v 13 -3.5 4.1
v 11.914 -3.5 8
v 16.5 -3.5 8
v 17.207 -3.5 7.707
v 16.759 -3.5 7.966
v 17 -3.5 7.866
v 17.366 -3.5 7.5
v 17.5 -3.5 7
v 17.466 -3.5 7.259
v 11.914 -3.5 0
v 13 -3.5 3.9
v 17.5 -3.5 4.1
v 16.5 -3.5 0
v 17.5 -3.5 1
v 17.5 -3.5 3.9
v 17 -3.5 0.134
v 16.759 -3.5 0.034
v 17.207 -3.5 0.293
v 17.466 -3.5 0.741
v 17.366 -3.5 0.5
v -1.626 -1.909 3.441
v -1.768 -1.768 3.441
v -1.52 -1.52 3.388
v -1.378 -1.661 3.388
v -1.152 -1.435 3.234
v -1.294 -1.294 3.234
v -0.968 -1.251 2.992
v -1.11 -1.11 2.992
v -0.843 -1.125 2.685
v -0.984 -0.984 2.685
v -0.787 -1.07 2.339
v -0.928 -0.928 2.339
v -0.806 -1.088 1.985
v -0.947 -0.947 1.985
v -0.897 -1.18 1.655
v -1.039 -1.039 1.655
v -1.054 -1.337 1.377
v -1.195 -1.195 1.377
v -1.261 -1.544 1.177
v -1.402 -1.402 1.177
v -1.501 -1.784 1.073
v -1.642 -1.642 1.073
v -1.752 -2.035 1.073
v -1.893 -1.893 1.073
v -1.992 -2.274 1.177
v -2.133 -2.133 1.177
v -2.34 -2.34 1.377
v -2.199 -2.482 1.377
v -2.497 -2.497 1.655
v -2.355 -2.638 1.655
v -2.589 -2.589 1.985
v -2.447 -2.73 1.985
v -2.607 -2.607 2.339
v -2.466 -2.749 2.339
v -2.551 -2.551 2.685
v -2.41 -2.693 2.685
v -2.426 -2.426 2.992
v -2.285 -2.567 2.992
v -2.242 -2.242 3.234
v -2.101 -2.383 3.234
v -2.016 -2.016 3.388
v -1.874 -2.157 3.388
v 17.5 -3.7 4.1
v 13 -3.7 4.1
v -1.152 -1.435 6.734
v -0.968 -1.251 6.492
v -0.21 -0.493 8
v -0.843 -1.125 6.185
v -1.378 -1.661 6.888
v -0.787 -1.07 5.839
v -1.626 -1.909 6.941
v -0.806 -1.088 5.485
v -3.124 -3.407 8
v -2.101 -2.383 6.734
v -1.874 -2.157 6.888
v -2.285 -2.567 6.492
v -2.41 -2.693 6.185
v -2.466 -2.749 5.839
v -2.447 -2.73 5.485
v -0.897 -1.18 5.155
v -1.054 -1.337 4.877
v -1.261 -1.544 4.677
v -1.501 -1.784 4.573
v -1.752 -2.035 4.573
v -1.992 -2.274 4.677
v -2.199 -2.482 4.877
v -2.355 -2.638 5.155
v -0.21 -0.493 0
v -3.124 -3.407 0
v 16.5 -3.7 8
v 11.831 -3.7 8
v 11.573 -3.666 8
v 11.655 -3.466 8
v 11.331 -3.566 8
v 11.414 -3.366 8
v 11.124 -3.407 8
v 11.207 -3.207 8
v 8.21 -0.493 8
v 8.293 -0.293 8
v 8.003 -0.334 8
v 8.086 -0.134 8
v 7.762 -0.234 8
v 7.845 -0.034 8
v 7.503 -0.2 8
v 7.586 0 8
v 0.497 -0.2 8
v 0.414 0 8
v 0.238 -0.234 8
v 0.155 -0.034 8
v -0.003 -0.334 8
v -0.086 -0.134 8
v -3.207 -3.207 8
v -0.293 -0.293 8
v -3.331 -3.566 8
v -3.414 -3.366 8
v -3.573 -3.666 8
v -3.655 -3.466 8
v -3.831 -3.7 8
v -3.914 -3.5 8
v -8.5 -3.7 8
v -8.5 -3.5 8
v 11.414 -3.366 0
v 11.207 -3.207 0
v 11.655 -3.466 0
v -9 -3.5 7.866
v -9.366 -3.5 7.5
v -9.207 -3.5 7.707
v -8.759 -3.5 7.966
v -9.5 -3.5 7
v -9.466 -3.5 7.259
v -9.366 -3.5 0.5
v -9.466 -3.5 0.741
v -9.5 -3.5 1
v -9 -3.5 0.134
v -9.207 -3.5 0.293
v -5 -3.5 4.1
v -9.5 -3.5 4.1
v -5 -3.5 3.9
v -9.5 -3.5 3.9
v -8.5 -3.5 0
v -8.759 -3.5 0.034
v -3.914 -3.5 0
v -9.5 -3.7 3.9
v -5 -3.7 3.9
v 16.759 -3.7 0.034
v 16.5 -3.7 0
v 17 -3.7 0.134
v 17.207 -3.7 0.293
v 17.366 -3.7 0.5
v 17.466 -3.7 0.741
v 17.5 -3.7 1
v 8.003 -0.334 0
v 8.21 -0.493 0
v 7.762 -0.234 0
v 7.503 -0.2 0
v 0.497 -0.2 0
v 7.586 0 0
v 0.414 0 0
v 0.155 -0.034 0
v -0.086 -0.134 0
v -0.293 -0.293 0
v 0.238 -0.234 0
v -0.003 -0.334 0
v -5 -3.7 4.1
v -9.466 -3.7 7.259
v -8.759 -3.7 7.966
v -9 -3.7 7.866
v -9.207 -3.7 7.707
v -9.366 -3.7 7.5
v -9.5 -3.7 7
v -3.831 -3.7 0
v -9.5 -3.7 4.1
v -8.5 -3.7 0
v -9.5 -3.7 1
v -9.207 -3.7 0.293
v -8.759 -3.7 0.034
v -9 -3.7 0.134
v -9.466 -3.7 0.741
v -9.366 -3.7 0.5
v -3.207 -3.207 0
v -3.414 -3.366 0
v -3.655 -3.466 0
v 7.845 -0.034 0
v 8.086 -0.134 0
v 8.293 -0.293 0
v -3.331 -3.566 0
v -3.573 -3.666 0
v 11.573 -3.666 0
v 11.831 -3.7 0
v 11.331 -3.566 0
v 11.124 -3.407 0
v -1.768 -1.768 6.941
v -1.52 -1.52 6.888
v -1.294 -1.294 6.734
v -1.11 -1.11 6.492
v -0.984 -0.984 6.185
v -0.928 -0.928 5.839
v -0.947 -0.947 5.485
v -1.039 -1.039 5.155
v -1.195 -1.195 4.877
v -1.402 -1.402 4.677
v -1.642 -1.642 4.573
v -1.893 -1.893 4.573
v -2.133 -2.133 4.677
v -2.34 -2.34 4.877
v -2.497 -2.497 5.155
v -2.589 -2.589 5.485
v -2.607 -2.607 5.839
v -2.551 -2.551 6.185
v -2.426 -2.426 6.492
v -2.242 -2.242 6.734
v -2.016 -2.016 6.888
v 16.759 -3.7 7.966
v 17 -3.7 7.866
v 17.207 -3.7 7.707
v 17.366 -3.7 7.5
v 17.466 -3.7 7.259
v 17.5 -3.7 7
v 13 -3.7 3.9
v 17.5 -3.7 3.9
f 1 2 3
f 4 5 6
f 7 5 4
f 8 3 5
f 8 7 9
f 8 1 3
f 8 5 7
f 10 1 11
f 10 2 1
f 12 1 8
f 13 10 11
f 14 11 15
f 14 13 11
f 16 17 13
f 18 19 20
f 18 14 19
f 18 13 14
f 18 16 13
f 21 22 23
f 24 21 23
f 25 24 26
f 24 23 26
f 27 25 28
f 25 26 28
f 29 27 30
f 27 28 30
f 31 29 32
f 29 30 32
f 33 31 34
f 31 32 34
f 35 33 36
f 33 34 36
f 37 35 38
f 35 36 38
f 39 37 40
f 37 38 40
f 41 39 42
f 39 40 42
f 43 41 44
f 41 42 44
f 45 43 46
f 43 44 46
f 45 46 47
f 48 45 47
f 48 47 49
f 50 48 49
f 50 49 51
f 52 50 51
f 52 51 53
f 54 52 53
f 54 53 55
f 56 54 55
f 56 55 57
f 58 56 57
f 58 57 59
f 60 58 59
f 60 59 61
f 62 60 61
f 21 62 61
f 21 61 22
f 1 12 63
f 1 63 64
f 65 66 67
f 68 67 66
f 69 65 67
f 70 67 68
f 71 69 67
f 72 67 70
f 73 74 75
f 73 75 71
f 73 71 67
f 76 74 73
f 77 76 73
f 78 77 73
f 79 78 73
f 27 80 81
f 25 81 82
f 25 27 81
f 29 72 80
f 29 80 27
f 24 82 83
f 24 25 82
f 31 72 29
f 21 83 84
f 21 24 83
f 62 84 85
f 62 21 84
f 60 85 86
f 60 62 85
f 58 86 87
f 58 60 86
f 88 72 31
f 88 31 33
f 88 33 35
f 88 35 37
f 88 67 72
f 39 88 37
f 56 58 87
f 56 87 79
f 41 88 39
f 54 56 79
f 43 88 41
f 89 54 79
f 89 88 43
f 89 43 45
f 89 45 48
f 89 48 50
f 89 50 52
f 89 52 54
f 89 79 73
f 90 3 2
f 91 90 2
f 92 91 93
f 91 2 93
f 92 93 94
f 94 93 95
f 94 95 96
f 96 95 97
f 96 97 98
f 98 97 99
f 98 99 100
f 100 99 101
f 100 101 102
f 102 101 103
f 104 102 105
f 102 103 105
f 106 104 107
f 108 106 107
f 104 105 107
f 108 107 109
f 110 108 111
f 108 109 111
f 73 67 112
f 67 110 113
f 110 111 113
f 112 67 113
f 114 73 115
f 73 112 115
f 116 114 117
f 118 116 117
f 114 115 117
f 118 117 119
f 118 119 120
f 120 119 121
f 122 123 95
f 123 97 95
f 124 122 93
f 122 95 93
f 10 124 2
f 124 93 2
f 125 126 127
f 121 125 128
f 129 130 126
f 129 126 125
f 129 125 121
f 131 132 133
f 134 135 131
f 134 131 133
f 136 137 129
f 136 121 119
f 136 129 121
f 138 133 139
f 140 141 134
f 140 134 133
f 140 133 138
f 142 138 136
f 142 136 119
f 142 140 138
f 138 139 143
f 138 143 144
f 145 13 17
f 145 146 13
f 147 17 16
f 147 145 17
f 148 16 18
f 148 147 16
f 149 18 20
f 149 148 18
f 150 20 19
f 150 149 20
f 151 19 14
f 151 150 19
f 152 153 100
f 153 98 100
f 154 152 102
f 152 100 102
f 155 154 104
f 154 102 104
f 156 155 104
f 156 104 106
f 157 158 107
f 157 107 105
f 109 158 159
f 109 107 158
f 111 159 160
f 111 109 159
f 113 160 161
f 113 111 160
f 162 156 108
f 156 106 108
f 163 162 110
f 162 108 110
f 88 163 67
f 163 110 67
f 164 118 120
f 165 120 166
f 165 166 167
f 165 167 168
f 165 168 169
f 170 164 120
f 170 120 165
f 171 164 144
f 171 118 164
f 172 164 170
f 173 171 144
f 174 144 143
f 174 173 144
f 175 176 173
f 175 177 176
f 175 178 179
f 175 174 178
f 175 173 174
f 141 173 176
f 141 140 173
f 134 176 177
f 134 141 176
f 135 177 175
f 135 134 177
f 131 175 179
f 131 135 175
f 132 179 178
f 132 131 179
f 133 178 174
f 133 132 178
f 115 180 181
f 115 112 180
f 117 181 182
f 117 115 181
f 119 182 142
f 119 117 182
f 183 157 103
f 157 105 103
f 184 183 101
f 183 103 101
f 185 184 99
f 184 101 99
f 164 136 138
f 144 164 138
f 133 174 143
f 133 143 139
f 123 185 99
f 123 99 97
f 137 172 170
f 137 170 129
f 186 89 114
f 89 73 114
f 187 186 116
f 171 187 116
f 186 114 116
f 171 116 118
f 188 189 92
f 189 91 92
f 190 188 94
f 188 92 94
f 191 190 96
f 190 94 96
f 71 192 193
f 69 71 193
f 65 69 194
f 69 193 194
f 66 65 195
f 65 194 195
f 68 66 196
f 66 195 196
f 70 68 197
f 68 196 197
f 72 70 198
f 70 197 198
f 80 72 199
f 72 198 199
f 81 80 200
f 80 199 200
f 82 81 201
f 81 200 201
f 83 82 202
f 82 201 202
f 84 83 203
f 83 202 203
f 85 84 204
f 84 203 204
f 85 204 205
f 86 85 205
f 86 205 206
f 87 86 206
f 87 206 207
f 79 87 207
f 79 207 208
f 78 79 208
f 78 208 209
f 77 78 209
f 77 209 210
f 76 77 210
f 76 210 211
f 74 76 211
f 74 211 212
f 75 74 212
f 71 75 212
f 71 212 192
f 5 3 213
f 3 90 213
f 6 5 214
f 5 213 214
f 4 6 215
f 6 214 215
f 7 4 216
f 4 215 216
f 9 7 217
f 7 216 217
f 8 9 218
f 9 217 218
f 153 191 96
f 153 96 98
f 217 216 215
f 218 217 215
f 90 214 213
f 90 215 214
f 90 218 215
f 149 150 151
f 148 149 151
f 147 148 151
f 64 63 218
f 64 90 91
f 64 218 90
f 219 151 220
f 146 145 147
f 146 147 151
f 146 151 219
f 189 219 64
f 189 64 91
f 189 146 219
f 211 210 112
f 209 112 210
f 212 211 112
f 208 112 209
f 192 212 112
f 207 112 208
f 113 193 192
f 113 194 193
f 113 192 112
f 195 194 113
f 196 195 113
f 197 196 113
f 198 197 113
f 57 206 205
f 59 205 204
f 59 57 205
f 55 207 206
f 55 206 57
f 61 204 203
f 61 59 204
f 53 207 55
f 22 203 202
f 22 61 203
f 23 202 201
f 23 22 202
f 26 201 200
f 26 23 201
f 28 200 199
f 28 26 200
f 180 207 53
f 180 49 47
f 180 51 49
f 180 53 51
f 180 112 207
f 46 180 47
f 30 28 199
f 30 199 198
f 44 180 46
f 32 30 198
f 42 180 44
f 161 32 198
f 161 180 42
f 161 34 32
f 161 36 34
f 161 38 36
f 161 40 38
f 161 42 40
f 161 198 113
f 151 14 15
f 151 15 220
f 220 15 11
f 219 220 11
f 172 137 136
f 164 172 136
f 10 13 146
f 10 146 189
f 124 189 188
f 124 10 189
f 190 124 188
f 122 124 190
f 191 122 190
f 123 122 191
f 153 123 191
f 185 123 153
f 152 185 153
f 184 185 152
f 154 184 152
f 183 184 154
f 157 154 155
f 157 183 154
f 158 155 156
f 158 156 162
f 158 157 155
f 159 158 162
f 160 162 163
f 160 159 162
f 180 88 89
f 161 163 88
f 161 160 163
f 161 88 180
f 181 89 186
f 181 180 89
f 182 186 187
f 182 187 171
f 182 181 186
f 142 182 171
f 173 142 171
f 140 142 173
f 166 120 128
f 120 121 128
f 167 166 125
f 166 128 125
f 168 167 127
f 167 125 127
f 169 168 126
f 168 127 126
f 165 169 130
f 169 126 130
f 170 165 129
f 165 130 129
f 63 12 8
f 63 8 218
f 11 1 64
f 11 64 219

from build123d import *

# Parameters (mm, degrees)
BOSS_EXTRUDE1_DEPTH = 8
SKETCH2_R           = 1.190625
CUT_EXTRUDE1_DEPTH  = 15.990663761
FILLET1_R           = 1
FILLET2_R           = 1
SKETCH3_W           = 4.5
SKETCH3_H           = 0.2
CUT_EXTRUDE2_DEPTH  = 10


with BuildPart() as part:
    # Sketch1 → Boss-Extrude1 (new body)
    with BuildSketch(Plane.XY):
        Polygon((0, 0), (8, 0), (11.5, -3.5), (17.5, -3.5), (17.5, -3.7), (11.417157288, -3.7), (7.917157288, -0.2), (0.082842712, -0.2), (-3.417157288, -3.7), (-9.5, -3.7), (-9.5, -3.5), (-3.5, -3.5), align=None)
    extrude(amount=BOSS_EXTRUDE1_DEPTH)

    # Sketch2 → Cut-Extrude1 (cut, through all)
    with BuildSketch(Plane(origin=(0, 0, 0), x_dir=(0, 0, 1), z_dir=(-0.707106781, 0.707106781, 0))):
        with Locations((2.25, -2.5)):
            Circle(SKETCH2_R)
        with Locations((5.75, -2.5)):
            Circle(SKETCH2_R)
    extrude(amount=-CUT_EXTRUDE1_DEPTH, mode=Mode.SUBTRACT)

    # Fillet1
    fillet1_edges = [part.edges().sort_by_distance(p)[0] for p in [
        (0, 0, 4),
        (8, 0, 4),
        (11.5, -3.5, 4),
        (11.417157288, -3.7, 4),
        (7.917157288, -0.2, 4),
        (0.082842712, -0.2, 4),
        (-3.417157288, -3.7, 4),
        (-3.5, -3.5, 4),
    ]]
    fillet(fillet1_edges, radius=FILLET1_R)

    # Fillet2
    fillet2_edges = [part.edges().sort_by_distance(p)[0] for p in [
        (-9.5, -3.6, 8),
        (17.5, -3.6, 0),
        (-9.5, -3.6, 0),
        (17.5, -3.6, 8),
    ]]
    fillet(fillet2_edges, radius=FILLET2_R)

    # Sketch3 → Cut-Extrude2 (cut)
    with BuildSketch(Plane(origin=(0, -3.5, 0), x_dir=(1, 0, 0), z_dir=(0, 1, 0))):
        with Locations((-7.25, -4)):
            Rectangle(SKETCH3_W, SKETCH3_H)
    cut_extrude2 = extrude(amount=-CUT_EXTRUDE2_DEPTH, mode=Mode.SUBTRACT)

    # Mirror1: Cut-Extrude2 across plane
    add(cut_extrude2.mirror(Plane(origin=(4, 0, 0), x_dir=(0, 0, 1), z_dir=(1, 0, 0))), mode=Mode.SUBTRACT)


solid = part.part
